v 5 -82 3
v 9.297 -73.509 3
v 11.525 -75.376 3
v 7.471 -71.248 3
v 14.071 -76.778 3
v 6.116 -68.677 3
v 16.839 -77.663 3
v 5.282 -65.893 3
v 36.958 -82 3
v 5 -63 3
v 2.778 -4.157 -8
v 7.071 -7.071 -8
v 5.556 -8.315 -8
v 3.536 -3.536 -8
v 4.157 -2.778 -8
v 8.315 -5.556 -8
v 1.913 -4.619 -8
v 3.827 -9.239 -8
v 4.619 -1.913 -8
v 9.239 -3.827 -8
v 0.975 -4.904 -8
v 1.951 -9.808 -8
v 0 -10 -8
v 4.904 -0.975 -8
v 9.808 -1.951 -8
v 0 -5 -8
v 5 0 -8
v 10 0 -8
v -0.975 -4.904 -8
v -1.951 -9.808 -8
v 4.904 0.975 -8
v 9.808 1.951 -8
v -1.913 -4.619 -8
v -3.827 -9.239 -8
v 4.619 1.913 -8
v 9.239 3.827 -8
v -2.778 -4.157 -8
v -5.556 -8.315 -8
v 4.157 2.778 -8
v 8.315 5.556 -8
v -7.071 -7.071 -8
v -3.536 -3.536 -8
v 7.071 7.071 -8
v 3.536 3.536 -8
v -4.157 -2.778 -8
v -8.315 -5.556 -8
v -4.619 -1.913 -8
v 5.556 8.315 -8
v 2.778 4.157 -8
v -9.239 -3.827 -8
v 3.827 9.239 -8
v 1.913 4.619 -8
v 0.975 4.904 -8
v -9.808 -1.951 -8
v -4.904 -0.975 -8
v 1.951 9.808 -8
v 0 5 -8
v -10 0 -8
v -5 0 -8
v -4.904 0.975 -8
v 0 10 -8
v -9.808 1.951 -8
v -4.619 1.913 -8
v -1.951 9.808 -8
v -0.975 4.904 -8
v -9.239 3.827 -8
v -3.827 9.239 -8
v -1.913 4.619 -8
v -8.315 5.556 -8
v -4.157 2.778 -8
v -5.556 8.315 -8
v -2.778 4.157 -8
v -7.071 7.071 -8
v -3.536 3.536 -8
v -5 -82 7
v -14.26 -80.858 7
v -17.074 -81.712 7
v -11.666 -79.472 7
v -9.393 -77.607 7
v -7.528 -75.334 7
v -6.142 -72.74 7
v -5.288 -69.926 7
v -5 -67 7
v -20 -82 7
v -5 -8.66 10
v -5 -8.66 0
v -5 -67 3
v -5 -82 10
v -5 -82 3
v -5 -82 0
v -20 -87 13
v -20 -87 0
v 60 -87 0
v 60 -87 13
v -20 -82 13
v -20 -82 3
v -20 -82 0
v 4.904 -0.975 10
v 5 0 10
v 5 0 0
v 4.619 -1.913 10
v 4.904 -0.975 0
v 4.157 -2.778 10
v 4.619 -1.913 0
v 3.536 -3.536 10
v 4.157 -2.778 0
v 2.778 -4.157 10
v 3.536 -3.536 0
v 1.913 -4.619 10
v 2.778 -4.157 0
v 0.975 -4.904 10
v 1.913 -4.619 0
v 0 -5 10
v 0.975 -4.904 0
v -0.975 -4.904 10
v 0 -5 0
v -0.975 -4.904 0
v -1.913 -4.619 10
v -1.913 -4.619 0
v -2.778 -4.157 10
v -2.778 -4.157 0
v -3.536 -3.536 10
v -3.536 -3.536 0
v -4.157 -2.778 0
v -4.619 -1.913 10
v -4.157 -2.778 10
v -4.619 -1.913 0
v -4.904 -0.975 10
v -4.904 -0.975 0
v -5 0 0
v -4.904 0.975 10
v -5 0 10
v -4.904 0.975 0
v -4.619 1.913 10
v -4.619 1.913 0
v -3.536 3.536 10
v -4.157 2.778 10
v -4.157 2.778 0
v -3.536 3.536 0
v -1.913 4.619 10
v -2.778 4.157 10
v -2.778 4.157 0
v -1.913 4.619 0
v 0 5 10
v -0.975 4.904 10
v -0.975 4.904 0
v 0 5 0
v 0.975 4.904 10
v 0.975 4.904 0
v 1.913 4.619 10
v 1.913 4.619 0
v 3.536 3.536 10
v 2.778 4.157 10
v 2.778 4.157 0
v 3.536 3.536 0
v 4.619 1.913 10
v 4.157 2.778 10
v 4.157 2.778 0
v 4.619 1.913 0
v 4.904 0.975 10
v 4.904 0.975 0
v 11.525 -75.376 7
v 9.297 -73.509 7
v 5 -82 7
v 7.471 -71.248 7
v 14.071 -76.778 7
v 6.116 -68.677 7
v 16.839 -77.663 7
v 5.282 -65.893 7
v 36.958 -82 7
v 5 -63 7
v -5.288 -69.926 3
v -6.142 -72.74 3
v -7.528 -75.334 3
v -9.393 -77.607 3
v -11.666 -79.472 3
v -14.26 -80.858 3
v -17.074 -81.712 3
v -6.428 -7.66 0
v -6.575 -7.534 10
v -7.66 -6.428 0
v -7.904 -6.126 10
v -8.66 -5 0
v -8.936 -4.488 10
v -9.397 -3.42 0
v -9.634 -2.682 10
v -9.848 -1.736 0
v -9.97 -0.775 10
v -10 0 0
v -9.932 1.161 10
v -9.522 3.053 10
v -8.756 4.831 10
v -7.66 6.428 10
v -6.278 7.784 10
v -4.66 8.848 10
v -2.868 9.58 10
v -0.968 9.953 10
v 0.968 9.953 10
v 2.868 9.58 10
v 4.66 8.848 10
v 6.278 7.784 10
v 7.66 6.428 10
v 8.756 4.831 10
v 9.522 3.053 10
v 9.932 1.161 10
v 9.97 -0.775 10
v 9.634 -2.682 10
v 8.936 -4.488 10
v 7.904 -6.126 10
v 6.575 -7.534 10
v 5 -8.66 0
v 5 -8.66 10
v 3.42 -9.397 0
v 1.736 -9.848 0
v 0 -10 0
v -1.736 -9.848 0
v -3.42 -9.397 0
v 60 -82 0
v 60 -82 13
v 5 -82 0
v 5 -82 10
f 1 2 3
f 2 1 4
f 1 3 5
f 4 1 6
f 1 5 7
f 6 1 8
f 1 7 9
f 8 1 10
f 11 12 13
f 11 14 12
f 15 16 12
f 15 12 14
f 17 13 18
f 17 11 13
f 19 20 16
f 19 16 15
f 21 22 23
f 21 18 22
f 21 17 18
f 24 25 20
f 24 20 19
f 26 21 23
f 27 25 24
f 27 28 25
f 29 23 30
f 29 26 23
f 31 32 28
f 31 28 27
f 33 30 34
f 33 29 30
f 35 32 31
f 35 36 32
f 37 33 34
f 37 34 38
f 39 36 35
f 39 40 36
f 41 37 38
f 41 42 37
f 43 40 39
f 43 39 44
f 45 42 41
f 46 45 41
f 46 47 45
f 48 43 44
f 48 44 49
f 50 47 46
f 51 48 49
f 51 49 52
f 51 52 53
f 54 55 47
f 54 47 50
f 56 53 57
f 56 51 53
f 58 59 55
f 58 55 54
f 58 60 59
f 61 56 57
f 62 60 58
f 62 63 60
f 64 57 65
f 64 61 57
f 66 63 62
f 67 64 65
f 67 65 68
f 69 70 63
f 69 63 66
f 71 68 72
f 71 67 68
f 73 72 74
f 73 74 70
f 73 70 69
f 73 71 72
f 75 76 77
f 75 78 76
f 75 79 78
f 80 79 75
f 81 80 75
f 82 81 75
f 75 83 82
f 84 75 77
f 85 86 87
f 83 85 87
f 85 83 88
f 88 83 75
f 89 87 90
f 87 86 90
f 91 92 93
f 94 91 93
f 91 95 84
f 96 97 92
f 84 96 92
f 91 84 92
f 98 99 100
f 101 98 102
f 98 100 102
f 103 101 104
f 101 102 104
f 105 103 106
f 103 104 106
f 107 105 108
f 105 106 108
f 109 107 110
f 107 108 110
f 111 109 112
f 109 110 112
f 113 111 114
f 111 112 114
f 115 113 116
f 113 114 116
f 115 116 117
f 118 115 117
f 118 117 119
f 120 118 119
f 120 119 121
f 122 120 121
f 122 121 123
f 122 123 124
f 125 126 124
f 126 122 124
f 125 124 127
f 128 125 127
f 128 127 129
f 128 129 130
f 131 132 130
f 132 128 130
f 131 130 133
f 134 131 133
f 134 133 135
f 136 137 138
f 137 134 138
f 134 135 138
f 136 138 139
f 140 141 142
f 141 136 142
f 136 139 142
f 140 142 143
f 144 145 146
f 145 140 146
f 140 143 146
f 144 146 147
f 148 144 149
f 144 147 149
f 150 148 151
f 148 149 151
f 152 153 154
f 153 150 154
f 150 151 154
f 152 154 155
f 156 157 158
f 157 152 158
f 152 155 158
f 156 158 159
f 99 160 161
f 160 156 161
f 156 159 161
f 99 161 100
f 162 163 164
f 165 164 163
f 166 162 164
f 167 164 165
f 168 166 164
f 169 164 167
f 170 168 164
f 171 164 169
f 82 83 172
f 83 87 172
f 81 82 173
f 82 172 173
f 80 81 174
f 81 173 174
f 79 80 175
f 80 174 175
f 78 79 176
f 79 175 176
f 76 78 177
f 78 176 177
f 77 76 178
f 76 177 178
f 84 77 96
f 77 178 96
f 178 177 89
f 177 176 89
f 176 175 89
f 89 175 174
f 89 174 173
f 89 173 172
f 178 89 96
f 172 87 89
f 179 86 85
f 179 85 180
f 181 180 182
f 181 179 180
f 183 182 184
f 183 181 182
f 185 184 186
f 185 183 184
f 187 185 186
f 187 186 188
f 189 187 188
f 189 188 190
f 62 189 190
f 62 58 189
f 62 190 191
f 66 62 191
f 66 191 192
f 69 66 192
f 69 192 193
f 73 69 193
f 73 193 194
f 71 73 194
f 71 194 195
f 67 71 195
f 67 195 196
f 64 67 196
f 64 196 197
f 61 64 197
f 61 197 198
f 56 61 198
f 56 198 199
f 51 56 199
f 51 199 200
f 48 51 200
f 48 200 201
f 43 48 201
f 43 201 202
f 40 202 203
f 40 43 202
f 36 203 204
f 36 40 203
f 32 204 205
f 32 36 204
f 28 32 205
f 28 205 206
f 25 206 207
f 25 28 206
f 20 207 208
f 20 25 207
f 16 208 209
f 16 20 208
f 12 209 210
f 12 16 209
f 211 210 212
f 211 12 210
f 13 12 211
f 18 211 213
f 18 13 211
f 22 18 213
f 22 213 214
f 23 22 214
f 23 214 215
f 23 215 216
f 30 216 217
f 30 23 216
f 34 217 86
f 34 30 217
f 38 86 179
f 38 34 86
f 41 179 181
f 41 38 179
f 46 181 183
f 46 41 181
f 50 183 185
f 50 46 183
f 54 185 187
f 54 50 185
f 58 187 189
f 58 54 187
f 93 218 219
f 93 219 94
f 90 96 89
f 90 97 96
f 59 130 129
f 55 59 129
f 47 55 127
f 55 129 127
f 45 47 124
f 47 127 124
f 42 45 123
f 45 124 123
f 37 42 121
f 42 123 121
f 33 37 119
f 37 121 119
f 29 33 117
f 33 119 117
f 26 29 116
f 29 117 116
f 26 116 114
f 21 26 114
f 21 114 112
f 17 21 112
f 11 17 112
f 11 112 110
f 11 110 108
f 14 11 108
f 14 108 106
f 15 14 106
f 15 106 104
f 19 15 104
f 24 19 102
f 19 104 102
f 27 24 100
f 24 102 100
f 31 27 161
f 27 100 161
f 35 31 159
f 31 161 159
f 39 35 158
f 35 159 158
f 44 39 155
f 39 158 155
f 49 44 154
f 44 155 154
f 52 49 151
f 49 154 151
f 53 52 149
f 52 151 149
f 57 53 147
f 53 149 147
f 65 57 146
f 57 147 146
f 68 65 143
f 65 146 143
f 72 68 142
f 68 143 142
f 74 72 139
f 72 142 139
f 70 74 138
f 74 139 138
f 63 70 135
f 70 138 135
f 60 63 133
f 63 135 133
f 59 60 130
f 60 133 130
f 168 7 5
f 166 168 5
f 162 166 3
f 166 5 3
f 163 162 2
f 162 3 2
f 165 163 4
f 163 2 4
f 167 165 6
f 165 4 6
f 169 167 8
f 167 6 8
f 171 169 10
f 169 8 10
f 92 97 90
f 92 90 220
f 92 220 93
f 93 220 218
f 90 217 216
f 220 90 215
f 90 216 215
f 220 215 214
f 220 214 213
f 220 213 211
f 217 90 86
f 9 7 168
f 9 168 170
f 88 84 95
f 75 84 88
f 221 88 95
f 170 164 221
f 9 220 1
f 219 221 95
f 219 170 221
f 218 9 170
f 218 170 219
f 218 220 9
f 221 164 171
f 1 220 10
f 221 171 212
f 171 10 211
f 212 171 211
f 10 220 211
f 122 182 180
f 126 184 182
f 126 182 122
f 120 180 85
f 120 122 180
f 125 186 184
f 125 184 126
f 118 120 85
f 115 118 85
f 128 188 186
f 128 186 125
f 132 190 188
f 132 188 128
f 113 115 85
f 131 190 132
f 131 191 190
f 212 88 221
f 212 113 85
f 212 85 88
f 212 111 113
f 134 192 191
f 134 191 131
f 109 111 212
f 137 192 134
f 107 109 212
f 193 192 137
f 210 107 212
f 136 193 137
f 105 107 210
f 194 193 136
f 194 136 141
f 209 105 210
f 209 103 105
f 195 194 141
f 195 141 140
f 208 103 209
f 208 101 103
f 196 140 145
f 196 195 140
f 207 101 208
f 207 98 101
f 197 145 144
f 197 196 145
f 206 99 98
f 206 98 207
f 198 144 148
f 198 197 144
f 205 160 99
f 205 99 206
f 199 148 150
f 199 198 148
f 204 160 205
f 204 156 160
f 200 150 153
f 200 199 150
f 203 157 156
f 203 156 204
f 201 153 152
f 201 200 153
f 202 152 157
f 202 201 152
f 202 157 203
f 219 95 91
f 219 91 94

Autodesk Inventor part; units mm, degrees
ref_plane "YZ Plane" through (0, 0, 0) normal (1, 0, 0) x (0, 1, 0)
ref_plane "XZ Plane" through (0, 0, 0) normal (0, 1, 0) x (-1, 0, 0)
sketch "Sketch1" plane through (0, 0, 0) normal (0, 0, 1) x (1, 0, 0)
  line L0 (0, 0) -> (0, -15) construction
  line L1 (-5, 0) -> (-5, -15)
  line L2 (5, -15) -> (5, 0)
  arc A0 (5, 0) -> (-5, 0) centre (0, 0) ccw
  arc A1 (-5, -15) -> (5, -15) centre (0, -15) ccw
  line L3 (0, 0) -> (0, -15) construction
  line L4 (-10, 0) -> (-10, -15)
  line L5 (10, -15) -> (10, 0)
  arc A2 (10, 0) -> (-10, 0) centre (0, 0) ccw
  line L6 (0, -15) -> (0, -87) construction
  line L7 (5, -23.6603) -> (5, -82)
  line L8 (-5, -23.6603) -> (-5, -82)
  arc A3 (-10, -15) -> (-5, -23.6603) centre (0, -15) ccw
  arc A4 (5, -23.6603) -> (10, -15) centre (0, -15) ccw
  line L9 (-20, -82) -> (60, -82)
  line L10 (60, -82) -> (60, -87)
  line L11 (60, -87) -> (-20, -87)
  line L12 (-20, -87) -> (-20, -82)
  circle A5 centre (0, 0) radius 5
  circle A6 centre (0, 0) radius 10
  line L13 (-5, -23.6603) -> (-5, 8.6603)
  line L14 (5, -23.6603) -> (5, 8.6603)
  point P0 (0, -7.5)
  point P1 (0, -7.5)
  point P2 (5, 0)
  point P3 (5, -8.6603)
  point P4 (-5, -8.6603)
  dimension "d0" = 15
  dimension "d1" = 5
  dimension "d2" = 10
  dimension "d3" = 72
  dimension "d4" = 5
  dimension "d5" = 5
  dimension "d7" = 80
  dimension "d8" = 5
  dimension "d24" = 15
extrude "Extrusion1" add sketch "Sketch1" along normal blind 10 contours A5 L2 A6 L1 | L13 A2 L14 A0 | L1 A6 A2 L13 | A6 L2 A1 L1 | L14 A2 A6 L2 | A1 L14 L7 L9 L8 L13 | L9 L10 L11 L12
sketch "Sketch2" plane through (0, 0, 0) normal (0, 0, -1) x (-1, 0, 0)
  arc A0 (-5, -15) -> (5, -15) centre (0, -15) ccw projected
  line L0 (0, 0) -> (0, -15) construction
  line L1 (-10, 0) -> (-10, -15)
  line L2 (10, -15) -> (10, 0)
  arc A1 (10, 0) -> (-10, 0) centre (0, 0) ccw
  arc A2 (-10, -15) -> (10, -15) centre (0, -15) ccw
  line L3 (0, 0) -> (0, -15) construction
  line L4 (-5, 0) -> (-5, -15)
  line L5 (5, -15) -> (5, 0)
  arc A3 (5, 0) -> (-5, 0) centre (0, 0) ccw
  arc A4 (-5, -15) -> (5, -15) centre (0, -15) ccw
  circle A5 centre (0, 0) radius 10
  circle A6 centre (0, 0) radius 5
  point P0 (0, -7.5)
  point P1 (0, -7.5)
  point P2 (-5, -15)
  dimension "d11" = 10
  dimension "d12" = 5
extrude "Extrusion2" add sketch "Sketch2" along normal blind 8 contours A5 A1 L5 A3 L4 | L4 A6 L5 A5
sketch "Sketch3" plane through (0, 0, 10) normal (0, 0, 1) x (1, 0, 0)
  line L0 (-20, -82) -> (-20, -87) projected
  line L1 (-20, -87) -> (60, -87) projected
  line L2 (-20, -82) -> (60, -82)
  line L3 (60, -82) -> (60, -87)
  line L4 (60, -87) -> (-20, -87)
  line L5 (-20, -87) -> (-20, -82)
  point P0 (0, 0)
  dimension "d23" = 80
extrude "Extrusion3" add sketch "Sketch3" along normal blind 3
ref_plane "Work Plane1" through (0, 0, 5) normal (0, 0, 1) x (1, 0, 0)
sketch "Sketch4" plane through (0, 0, 5) normal (0, 0, 1) x (1, 0, 0)
  arc A0 (-20, -82) -> (-5, -67) centre (-20, -67) ccw
  line L0 (-5, -23.6603) -> (-5, -82) projected
  line L1 (60, -82) -> (-20, -82) projected
  line L2 (-5, -67) -> (-20, -67) construction
  line L3 (-20, -67) -> (-20, -82) construction
  line L4 (-20, -82) -> (-5, -82)
  line L5 (-5, -82) -> (-5, -67)
  arc A1 (5, -63) -> (16.8392, -77.6632) centre (20, -63) ccw
  line L6 (5, -82) -> (5, -23.6603) projected
  line L7 (16.8392, -77.6632) -> (36.9579, -82)
  line L8 (5, -82) -> (5, -63)
  point P0 (0, 0)
  point P1 (-20, -82)
  dimension "d17" = 15
  dimension "d18" = 30
  dimension "d20" = 19
extrude "Extrusion4" add sketch "Sketch4" along normal mid plane 4
equation "\"d9\" = d2"
properties part number "Stand" material "Steel, Mild"
